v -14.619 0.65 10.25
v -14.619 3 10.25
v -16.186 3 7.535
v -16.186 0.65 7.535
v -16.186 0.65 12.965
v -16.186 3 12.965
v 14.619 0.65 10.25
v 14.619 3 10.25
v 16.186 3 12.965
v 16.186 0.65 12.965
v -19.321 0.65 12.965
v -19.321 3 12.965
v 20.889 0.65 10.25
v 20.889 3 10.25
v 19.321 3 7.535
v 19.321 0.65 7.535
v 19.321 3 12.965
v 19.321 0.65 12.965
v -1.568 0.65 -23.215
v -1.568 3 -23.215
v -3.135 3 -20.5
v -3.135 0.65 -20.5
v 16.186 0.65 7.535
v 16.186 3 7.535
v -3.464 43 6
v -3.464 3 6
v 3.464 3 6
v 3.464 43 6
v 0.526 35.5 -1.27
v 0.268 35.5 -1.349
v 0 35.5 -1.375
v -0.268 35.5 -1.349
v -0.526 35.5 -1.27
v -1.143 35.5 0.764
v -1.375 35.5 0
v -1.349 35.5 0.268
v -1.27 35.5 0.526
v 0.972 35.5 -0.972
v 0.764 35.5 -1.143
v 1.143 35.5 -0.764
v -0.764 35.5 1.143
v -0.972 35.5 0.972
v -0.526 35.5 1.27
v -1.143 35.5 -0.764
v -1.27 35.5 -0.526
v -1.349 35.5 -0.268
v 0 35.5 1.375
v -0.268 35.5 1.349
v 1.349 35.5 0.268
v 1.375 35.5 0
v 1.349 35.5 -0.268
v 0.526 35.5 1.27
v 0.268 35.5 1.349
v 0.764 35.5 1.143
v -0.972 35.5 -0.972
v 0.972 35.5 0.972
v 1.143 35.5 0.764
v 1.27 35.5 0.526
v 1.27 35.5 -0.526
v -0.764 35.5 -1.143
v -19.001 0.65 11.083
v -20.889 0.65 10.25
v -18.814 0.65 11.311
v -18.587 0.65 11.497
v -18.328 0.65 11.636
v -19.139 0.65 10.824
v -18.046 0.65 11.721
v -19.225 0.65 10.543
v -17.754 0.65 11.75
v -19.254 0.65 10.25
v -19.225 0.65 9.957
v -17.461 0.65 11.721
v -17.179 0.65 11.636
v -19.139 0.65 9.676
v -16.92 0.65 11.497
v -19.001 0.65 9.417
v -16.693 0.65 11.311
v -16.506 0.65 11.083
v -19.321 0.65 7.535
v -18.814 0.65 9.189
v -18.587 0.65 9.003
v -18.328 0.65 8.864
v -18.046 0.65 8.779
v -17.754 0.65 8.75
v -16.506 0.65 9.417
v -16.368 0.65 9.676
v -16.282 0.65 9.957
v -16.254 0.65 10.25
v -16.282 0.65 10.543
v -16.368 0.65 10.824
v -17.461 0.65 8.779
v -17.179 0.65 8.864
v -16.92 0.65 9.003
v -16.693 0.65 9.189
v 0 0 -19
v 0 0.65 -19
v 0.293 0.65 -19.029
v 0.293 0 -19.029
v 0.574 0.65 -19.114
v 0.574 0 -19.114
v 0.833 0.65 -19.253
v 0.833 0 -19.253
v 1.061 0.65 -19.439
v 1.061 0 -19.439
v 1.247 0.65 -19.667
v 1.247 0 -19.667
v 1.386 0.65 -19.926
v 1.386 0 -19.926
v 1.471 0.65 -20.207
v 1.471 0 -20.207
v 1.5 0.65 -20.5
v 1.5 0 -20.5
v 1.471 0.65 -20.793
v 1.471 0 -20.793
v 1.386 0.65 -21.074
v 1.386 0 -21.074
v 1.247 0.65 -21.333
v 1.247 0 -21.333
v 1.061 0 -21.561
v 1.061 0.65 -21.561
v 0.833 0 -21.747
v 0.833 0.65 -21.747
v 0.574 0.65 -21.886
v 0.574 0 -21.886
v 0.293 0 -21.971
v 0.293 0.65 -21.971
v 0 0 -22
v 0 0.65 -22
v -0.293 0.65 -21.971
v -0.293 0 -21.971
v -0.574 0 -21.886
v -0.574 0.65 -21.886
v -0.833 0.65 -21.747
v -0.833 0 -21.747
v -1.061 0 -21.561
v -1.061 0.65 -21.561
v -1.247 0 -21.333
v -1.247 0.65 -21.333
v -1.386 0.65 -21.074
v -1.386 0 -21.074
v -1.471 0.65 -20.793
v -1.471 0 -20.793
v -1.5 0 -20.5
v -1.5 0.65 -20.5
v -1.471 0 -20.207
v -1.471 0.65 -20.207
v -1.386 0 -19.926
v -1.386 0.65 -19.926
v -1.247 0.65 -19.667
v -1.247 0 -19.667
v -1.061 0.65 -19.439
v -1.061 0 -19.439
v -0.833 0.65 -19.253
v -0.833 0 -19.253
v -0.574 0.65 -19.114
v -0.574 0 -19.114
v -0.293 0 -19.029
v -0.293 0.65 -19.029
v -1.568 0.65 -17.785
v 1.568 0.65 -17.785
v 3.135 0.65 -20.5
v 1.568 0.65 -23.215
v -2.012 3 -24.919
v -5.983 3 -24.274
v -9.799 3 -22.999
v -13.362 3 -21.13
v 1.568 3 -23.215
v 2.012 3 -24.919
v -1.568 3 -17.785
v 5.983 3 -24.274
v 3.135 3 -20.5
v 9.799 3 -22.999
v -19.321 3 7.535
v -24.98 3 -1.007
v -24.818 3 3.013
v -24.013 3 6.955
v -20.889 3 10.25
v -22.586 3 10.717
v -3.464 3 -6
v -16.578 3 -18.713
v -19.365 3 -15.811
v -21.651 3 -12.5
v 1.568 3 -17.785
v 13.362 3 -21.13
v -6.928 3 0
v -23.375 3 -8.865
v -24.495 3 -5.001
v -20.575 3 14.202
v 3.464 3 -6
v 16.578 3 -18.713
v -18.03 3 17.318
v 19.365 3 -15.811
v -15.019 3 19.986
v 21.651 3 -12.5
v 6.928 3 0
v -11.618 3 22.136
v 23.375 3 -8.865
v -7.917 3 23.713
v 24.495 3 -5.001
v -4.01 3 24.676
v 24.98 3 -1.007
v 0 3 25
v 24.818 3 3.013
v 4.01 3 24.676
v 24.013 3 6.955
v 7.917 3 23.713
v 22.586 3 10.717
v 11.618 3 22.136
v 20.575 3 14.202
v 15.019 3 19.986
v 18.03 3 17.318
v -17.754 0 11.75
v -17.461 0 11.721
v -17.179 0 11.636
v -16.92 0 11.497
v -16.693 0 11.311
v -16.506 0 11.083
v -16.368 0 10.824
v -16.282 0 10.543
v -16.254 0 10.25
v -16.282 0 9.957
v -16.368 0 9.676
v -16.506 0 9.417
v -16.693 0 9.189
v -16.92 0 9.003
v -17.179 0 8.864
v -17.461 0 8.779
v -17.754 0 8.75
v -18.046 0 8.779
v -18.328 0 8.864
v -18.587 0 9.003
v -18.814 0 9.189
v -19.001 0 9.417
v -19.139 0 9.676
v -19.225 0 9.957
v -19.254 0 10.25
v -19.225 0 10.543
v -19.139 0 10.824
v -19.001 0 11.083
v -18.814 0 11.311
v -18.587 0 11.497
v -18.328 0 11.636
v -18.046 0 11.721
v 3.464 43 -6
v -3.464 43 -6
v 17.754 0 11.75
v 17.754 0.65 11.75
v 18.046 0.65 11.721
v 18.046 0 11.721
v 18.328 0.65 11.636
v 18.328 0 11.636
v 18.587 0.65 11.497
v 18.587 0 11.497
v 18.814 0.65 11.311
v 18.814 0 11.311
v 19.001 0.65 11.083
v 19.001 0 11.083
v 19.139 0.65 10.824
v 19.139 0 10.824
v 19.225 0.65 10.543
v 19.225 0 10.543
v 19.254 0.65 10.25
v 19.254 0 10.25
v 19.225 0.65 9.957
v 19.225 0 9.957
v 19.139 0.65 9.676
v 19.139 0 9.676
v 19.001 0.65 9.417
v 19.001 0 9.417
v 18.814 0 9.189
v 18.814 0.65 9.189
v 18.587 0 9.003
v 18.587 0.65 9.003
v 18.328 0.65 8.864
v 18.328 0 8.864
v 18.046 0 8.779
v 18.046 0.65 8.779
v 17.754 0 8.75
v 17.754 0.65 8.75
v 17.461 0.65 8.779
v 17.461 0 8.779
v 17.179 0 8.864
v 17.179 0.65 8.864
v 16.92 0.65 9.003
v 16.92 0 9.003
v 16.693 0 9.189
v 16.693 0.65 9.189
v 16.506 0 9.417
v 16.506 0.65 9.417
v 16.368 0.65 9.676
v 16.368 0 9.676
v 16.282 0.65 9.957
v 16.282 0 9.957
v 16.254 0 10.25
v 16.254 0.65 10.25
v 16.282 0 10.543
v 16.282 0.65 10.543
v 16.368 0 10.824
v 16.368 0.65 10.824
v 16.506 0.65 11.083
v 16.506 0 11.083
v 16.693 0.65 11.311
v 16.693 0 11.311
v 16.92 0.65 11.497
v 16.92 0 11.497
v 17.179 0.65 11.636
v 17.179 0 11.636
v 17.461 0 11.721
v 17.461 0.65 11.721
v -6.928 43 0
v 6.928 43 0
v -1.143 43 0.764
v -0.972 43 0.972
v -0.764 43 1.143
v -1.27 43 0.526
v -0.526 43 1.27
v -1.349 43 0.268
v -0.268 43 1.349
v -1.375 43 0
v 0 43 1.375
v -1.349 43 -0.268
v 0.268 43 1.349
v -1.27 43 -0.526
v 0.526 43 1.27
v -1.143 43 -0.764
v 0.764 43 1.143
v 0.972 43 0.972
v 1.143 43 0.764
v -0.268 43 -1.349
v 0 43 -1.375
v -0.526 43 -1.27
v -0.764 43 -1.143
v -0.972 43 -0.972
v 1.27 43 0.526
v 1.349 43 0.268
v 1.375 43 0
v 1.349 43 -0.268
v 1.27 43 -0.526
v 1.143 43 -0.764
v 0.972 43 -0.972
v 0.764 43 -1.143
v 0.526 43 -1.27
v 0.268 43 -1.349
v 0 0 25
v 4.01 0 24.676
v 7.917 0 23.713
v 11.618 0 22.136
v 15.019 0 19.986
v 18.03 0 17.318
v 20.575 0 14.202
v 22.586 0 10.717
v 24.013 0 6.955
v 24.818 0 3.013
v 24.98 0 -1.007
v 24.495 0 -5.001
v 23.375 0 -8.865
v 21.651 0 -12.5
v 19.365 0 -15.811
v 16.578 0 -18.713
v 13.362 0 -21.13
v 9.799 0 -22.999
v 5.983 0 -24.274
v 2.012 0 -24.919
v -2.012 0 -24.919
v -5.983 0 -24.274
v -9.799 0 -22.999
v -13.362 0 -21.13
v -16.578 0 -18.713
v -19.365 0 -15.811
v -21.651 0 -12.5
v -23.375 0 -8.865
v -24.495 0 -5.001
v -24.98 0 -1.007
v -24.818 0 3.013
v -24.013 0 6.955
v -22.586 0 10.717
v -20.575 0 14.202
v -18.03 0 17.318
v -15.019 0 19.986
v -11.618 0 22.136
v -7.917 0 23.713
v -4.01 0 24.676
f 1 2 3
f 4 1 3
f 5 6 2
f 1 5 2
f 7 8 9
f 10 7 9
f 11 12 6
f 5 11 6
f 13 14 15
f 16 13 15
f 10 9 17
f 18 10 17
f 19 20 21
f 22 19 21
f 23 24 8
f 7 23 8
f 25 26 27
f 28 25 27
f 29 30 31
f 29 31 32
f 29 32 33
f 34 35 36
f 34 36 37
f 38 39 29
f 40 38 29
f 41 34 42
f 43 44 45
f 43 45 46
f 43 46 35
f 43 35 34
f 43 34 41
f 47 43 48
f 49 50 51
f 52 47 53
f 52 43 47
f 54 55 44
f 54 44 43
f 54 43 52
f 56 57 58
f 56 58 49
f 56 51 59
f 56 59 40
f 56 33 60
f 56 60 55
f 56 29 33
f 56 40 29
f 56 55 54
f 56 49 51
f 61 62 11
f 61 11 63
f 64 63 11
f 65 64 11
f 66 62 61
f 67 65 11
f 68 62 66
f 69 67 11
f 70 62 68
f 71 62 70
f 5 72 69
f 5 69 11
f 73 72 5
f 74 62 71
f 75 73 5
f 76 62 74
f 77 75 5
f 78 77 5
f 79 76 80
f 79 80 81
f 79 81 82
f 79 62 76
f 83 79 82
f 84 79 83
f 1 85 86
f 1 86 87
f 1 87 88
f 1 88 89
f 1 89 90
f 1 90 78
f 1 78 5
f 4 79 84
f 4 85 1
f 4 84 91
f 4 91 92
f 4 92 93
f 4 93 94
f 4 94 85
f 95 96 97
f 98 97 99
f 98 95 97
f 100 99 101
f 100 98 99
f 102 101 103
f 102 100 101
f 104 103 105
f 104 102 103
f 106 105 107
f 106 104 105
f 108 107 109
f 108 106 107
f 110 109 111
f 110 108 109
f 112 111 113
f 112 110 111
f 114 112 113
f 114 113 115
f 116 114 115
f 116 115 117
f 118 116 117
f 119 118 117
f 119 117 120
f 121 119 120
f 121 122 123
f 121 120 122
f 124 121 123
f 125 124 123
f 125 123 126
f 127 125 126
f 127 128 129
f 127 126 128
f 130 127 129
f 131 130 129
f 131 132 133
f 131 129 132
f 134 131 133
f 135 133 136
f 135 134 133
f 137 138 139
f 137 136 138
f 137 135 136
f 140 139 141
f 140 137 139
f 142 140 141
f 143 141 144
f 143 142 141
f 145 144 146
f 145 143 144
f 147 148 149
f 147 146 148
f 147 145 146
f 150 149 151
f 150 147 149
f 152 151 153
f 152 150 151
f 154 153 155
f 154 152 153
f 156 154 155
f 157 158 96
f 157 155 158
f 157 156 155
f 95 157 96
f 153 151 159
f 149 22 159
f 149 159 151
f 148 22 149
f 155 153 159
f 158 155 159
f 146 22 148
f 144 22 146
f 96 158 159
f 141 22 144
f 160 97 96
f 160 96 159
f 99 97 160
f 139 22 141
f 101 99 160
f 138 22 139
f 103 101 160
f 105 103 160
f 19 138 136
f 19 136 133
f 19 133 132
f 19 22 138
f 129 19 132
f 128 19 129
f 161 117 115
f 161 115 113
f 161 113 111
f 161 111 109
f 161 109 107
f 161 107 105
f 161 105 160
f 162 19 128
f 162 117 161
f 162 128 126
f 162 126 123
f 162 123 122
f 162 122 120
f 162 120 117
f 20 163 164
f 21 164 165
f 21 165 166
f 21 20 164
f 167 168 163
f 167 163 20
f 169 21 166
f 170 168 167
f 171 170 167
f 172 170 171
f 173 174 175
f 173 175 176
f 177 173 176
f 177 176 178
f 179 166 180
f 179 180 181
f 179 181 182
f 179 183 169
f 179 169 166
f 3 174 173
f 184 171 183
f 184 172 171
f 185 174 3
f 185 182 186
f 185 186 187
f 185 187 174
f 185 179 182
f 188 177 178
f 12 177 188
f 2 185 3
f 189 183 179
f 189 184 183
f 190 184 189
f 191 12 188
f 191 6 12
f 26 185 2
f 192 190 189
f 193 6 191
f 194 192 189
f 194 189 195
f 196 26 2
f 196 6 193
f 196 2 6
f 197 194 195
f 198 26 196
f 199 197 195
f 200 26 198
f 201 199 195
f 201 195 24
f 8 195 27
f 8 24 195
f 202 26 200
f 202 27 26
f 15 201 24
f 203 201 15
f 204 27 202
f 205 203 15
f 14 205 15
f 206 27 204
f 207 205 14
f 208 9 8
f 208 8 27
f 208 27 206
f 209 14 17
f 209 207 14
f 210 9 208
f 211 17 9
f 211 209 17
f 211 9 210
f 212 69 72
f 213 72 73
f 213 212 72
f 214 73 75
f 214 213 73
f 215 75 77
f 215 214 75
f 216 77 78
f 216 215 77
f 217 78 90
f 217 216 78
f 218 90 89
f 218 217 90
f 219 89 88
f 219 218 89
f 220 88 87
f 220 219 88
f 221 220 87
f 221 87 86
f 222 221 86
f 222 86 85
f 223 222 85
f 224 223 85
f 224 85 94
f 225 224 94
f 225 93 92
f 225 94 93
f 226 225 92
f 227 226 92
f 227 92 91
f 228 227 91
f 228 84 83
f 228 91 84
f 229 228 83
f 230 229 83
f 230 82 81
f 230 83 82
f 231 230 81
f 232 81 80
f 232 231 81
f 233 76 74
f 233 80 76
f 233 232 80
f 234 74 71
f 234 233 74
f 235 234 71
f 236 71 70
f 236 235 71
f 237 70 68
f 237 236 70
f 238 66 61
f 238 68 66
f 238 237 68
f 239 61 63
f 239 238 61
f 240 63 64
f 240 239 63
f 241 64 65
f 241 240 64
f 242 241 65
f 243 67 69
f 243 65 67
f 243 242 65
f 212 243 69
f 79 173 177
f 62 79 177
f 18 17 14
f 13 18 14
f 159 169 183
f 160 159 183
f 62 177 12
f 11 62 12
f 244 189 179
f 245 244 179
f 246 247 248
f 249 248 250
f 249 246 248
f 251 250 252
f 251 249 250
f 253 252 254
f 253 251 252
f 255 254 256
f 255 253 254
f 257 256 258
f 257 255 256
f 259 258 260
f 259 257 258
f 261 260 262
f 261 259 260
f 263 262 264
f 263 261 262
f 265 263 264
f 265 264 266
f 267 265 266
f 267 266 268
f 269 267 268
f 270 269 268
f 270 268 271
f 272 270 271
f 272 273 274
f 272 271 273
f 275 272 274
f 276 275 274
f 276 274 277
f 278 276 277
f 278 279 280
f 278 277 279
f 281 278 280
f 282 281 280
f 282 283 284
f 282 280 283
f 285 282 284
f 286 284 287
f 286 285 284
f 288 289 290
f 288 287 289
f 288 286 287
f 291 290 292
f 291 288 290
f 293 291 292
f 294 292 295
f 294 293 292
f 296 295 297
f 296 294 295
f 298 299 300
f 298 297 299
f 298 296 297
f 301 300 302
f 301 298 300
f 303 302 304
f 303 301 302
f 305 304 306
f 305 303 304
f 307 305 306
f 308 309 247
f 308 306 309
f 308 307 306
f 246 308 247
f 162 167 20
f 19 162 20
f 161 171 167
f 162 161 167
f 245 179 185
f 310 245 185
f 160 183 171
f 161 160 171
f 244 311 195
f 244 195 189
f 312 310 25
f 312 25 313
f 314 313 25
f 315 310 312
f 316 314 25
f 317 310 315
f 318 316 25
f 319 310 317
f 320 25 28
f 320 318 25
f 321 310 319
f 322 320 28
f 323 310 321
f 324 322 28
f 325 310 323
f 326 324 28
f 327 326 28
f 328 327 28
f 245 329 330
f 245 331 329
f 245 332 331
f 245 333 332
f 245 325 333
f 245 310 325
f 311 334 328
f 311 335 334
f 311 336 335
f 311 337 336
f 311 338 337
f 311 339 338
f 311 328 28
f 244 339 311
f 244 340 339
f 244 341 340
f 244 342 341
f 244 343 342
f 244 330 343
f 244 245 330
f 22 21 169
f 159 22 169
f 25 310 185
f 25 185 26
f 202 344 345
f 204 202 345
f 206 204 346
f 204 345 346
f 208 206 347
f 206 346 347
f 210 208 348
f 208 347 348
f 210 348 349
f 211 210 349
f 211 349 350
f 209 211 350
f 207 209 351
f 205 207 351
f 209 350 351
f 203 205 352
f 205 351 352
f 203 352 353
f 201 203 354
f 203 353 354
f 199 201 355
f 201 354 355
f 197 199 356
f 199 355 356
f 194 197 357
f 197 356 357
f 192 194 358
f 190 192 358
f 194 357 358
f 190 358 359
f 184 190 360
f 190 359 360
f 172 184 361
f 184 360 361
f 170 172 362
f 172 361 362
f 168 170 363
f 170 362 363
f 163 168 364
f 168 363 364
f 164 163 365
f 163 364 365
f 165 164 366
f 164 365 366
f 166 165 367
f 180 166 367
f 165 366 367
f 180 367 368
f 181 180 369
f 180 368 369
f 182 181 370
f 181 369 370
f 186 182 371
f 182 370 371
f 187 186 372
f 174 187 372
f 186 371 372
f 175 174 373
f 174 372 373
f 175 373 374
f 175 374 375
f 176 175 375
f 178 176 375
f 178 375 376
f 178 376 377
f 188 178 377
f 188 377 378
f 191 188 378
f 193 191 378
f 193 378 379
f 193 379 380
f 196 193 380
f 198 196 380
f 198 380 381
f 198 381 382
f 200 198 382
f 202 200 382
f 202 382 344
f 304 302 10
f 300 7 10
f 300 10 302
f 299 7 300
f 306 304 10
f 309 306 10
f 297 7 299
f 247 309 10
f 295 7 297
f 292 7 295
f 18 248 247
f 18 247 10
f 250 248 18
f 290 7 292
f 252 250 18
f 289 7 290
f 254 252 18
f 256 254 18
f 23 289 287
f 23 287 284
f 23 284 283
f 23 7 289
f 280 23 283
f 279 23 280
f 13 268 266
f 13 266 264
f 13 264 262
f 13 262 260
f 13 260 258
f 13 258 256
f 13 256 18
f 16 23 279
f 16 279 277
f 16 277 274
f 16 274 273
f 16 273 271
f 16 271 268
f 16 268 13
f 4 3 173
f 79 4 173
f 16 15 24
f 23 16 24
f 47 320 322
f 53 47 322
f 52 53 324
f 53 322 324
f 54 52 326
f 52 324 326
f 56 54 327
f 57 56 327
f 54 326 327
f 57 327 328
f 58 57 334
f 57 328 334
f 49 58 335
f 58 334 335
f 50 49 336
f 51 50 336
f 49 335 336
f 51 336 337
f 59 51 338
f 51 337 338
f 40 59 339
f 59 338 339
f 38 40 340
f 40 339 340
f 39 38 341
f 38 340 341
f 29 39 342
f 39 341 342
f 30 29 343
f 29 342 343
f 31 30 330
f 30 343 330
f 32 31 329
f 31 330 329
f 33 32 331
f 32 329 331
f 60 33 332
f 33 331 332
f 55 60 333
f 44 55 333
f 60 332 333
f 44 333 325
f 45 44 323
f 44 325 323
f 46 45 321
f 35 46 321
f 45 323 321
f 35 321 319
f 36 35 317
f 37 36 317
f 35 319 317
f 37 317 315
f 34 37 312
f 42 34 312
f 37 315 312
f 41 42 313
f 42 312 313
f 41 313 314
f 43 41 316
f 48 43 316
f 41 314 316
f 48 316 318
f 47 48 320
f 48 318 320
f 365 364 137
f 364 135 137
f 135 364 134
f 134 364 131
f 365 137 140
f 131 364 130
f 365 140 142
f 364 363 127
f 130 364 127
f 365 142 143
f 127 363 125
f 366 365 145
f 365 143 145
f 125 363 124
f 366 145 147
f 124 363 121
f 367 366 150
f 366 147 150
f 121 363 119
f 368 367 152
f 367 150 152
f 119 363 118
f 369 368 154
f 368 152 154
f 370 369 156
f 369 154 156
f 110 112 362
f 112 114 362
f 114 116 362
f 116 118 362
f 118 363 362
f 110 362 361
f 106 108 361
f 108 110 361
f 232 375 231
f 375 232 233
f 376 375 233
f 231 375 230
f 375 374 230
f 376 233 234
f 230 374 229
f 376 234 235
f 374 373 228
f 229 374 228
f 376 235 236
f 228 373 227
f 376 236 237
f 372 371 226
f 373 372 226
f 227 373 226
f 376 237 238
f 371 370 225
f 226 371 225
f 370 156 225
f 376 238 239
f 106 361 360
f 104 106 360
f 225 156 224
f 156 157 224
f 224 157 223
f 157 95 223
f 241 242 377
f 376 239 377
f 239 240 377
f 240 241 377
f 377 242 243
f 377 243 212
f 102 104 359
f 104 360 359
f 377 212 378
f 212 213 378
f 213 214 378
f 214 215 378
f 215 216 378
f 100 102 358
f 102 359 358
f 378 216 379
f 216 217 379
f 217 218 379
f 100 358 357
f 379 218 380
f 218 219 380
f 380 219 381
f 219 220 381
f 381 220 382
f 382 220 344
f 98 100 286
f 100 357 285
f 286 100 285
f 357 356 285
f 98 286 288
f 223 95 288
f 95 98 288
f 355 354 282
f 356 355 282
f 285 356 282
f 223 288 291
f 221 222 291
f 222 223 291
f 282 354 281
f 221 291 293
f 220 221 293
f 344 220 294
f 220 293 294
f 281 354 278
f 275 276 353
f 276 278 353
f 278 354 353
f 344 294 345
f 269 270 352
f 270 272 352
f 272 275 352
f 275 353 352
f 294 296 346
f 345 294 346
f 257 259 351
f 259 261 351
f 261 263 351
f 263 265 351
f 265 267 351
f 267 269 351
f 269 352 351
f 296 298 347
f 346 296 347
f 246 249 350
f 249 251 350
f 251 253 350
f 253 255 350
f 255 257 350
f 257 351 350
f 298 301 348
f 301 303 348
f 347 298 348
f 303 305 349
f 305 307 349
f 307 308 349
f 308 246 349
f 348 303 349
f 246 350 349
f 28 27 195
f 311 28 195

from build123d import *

# Parameters (mm, degrees)
SKETCH1_R           = 25
SKETCH1_R_2         = 1.5
BOSS_EXTRUDE1_DEPTH = 3
BOSS_EXTRUDE2_DEPTH = 40
SKETCH4_R           = 1.375
CUT_EXTRUDE1_DEPTH  = 7.5
CUT_EXTRUDE2_DEPTH  = 2.35


with BuildPart() as part:
    # Sketch1 → Boss-Extrude1 (new body)
    with BuildSketch(Plane(origin=(0, 0, 0), x_dir=(1, 0, 0), z_dir=(0, 1, 0))):
        with Locations(Location((0, 0, 0), (0, 0, 270))):
            Circle(SKETCH1_R)
        with Locations(Location((0, 20.5, 0), (0, 0, 270))):
            Circle(SKETCH1_R_2, mode=Mode.SUBTRACT)
        with Locations(Location((17.753520778, -10.25, 0), (0, 0, 270))):
            Circle(SKETCH1_R_2, mode=Mode.SUBTRACT)
        with Locations(Location((-17.753520778, -10.25, 0), (0, 0, 270))):
            Circle(SKETCH1_R_2, mode=Mode.SUBTRACT)
    extrude(amount=BOSS_EXTRUDE1_DEPTH)

    # Sketch3 → Boss-Extrude2 (add)
    with BuildSketch(Plane(origin=(0, 3, 0), x_dir=(1, 0, 0), z_dir=(0, 1, 0))):
        Polygon((-6.92820323, 0), (-3.464101615, -6), (3.464101615, -6), (6.92820323, 0), (3.464101615, 6), (-3.464101615, 6), align=None)
    extrude(amount=BOSS_EXTRUDE2_DEPTH)

    # Sketch4 → Cut-Extrude1 (cut)
    with BuildSketch(Plane(origin=(0, 43, 0), x_dir=(1, 0, 0), z_dir=(0, 1, 0))):
        with Locations(Location((0, 0, 0), (0, 0, 270))):
            Circle(SKETCH4_R)
    extrude(amount=-CUT_EXTRUDE1_DEPTH, mode=Mode.SUBTRACT)

    # Sketch5 → Cut-Extrude2 (cut)
    with BuildSketch(Plane(origin=(0, 3, 0), x_dir=(1, 0, 0), z_dir=(0, 1, 0))):
        Polygon((1.567505981, 23.215), (-1.567505981, 23.215), (-3.135011962, 20.5), (-1.567505981, 17.785), (1.567505981, 17.785), (3.135011962, 20.5), align=None)
        Polygon((19.321026758, -12.965), (20.888532739, -10.25), (19.321026758, -7.535), (16.186014797, -7.535), (14.618508816, -10.25), (16.186014797, -12.965), align=None)
        Polygon((-20.888532739, -10.25), (-19.321026758, -12.965), (-16.186014797, -12.965), (-14.618508816, -10.25), (-16.186014797, -7.535), (-19.321026758, -7.535), align=None)
    extrude(amount=-CUT_EXTRUDE2_DEPTH, mode=Mode.SUBTRACT)


solid = part.part
